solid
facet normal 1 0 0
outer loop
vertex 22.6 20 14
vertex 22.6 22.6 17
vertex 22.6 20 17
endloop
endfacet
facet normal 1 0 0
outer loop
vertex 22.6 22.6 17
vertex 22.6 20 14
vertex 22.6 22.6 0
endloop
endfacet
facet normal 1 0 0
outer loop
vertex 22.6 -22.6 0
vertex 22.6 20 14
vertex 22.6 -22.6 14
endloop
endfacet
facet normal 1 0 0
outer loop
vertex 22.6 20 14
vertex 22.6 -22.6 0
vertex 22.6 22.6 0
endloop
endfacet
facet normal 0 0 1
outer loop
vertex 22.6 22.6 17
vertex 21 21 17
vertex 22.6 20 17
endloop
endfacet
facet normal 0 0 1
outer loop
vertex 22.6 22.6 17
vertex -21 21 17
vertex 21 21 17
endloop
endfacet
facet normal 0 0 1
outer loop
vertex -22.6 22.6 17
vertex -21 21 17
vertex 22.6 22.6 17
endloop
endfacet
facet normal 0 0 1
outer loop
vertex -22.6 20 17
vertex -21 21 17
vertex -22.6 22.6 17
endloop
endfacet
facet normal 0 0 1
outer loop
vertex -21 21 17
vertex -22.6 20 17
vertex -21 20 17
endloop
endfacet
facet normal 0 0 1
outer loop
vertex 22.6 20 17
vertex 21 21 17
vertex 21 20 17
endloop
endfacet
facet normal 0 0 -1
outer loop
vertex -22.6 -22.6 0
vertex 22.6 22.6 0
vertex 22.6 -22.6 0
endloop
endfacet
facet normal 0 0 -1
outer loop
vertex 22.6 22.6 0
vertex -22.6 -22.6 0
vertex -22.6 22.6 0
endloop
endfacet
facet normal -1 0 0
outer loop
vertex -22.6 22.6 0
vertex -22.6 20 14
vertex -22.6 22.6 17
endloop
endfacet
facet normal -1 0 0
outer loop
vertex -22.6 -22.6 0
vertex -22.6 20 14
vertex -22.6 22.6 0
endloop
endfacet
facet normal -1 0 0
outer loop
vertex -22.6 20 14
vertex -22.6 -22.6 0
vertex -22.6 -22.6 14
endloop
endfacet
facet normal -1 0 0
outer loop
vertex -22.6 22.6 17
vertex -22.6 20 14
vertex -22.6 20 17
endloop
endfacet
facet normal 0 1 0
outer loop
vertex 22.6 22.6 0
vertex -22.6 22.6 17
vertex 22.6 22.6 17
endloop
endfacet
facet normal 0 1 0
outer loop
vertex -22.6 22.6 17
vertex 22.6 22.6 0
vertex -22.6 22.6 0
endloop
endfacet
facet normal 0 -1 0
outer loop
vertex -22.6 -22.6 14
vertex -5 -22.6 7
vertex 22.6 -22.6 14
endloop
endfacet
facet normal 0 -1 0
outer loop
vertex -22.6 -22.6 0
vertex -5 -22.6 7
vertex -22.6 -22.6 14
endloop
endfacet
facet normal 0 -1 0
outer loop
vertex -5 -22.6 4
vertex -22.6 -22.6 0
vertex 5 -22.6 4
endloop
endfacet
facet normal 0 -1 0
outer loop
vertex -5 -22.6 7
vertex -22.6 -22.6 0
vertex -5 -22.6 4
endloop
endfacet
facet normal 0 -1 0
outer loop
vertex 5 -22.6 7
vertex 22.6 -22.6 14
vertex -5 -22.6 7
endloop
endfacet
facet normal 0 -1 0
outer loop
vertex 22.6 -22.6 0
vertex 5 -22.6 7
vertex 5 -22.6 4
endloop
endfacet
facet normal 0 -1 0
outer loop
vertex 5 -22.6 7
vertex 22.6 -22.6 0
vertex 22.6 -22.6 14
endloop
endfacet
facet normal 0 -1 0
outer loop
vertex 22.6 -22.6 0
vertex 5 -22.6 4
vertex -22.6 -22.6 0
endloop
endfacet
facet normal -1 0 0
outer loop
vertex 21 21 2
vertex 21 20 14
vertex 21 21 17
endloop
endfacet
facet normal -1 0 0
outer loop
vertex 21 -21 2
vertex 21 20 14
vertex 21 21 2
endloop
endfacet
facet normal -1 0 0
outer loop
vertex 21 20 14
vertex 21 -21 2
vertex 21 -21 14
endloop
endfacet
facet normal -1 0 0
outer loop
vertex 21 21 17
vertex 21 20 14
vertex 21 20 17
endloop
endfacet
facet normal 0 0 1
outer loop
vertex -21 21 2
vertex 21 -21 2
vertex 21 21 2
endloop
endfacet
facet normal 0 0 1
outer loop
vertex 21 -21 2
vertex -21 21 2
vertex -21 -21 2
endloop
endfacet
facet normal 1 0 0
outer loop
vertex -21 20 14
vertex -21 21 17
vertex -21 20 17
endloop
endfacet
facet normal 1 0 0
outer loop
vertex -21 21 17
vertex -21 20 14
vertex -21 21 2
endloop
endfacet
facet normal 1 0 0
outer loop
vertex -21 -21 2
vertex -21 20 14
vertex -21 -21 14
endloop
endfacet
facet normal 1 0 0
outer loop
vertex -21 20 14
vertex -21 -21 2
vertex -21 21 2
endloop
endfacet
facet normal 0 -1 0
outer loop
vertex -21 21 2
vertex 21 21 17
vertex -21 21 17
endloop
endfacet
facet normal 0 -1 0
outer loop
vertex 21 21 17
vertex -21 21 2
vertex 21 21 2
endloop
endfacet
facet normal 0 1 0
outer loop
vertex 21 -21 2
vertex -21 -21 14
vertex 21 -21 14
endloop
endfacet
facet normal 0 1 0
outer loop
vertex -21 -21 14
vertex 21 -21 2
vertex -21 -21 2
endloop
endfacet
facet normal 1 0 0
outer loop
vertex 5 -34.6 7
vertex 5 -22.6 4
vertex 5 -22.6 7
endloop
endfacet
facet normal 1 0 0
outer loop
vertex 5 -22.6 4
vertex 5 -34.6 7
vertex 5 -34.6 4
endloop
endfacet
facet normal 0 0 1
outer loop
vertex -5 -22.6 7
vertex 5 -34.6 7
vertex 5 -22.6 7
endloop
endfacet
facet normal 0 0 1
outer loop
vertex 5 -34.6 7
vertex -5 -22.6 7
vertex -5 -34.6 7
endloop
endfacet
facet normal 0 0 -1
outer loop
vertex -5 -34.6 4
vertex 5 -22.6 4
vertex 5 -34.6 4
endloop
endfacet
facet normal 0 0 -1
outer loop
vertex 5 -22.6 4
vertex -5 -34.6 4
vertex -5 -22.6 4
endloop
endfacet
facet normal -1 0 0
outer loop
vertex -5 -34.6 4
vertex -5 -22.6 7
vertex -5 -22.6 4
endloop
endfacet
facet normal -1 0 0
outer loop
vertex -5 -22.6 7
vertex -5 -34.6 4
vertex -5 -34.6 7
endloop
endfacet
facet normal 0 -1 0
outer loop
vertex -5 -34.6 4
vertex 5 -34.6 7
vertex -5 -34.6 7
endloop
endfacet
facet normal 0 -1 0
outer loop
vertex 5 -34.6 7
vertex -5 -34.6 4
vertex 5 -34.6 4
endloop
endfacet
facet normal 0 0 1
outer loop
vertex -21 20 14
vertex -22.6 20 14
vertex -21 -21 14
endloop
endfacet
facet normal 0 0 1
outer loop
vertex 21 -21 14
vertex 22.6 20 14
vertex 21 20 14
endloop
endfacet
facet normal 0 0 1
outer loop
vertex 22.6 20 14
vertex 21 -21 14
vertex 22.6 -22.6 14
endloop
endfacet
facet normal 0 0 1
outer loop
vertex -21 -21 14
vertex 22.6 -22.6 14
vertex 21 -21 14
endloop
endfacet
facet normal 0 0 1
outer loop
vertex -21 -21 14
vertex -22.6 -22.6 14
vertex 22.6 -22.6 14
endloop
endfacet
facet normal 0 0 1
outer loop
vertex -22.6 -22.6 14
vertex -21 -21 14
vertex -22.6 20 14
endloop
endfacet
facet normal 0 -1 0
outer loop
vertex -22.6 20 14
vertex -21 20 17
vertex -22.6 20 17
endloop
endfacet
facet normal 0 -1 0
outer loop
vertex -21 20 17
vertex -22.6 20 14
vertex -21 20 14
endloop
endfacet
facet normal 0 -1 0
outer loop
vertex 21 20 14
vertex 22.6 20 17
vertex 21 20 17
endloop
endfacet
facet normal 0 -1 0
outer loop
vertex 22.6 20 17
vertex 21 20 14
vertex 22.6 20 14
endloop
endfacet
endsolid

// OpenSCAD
// file: ../lib/dovetail.scad
// lib/dovetail.scad
// Shared joinery modules: dovetail tenon/mortise, M3 insert boss, rounded box.
// Depends on values in params.scad (include it in the calling file).

// A dovetail tenon: a flared prism that grows wider toward its tip so it locks
// against a matching mortise when slid in along +y.
//   len   : protrusion length (along +y)
//   base_w: width at the root (x, near the part)
//   tip_w : width at the tip (x, wider -> self locking)
//   h     : height (z)
// Literal defaults keep this library self-contained under `use <>` (which does
// not import the caller's params). Callers pass explicit sizes where needed.
module dovetail_tenon(len = 8, base_w = 8, tip_w = 12, h = 10) {
    linear_extrude(height = h)
        polygon(points = [
            [-base_w/2, 0],
            [ base_w/2, 0],
            [ tip_w/2,  len],
            [-tip_w/2,  len],
        ]);
}

// Matching mortise volume (subtract this). Enlarged by tol_dovetail per side.
module dovetail_mortise(len = 8, base_w = 8, tip_w = 12, h = 10, clr = 0.15) {
    // extend slightly beyond both faces so the cut is clean
    translate([0, -0.01, -0.01])
        linear_extrude(height = h + 0.02)
            polygon(points = [
                [-(base_w/2 + clr), 0],
                [ (base_w/2 + clr), 0],
                [ (tip_w/2 + clr),  len + 0.02],
                [-(tip_w/2 + clr),  len + 0.02],
            ]);
}

// Cylindrical boss with a blind hole for a heat-set insert.
//   boss_d : outer diameter of the boss
//   boss_h : height
//   hole_d : insert press-hole diameter (params: m3_insert)
//   hole_depth : blind hole depth (0 = through)
module insert_boss(boss_d = 8, boss_h = 8, hole_d = 4.0, hole_depth = 0) {
    difference() {
        cylinder(d = boss_d, h = boss_h);
        translate([0, 0, hole_depth == 0 ? -0.01 : boss_h - hole_depth])
            cylinder(d = hole_d, h = hole_depth == 0 ? boss_h + 0.02 : hole_depth + 0.01);
    }
}

// Rounded rectangular box shell (open top) used by gondola / recesses.
module rounded_box(x, y, z, r = 2) {
    hull() {
        for (sx = [-1, 1], sy = [-1, 1])
            translate([sx * (x/2 - r), sy * (y/2 - r), 0])
                cylinder(r = r, h = z);
    }
}

// A simple rectangular slot cutter (for tabs), centered on x, open along z.
module slot(w, t, d) {
    translate([-w/2, -t/2, -0.01])
        cube([w, t, d + 0.02]);
}
// main file
// mini/adapter_gondola.scad  (#19: Artec wooden ferris kit 055521)
// Drop-in bucket that replaces one wooden gondola. A back peg (tab) mimics the
// wooden seat's protrusion that plugs into the arm-ring's outer hole, so the
// kit is not modified (reversible). Two variants for the ride-along figures.
//   variant = "atomcat"  : inner floor 42x42
//   variant = "minimal"  : inner floor 46x46
// Select at CLI: openscad -D 'variant="minimal"' -o mini-adapter-minimal.stl ...
//
// NOTE: tab/pitch/wheel/seat dimensions are PLACEHOLDERS pending caliper
// measurement (see params.scad mini_* and issue #19). Parametric: change the
// numbers in params.scad and regenerate.
//
// Prints back-face-down (the tab then points up) or floor-down with a tiny
// support under the peg. Modelled floor-down so the STL sits on z=0.

include <../params.scad>;
use <../lib/dovetail.scad>;

variant = "atomcat";     // overridden from the Makefile

inner  = (variant == "minimal") ? mini_minimal_in : mini_atomcat_in;
outer  = inner + 2 * mini_wall;

module adapter_gondola() {
    difference() {
        union() {
            // bucket: floor + back/side walls (mini_depth) + taller front guard
            difference() {
                translate([-outer/2, -outer/2, 0])
                    cube([outer, outer, mini_floor_t + max(mini_depth, mini_guard_h)]);
                // hollow the cavity (open top)
                translate([-inner/2, -inner/2, mini_floor_t])
                    cube([inner, inner, mini_depth + mini_guard_h + 1]);
            }
            // back peg that plugs into the arm-ring outer hole
            translate([-mini_tab_w/2, -outer/2 - mini_tab_l, mini_floor_t + 2])
                cube([mini_tab_w, mini_tab_l + 1, mini_tab_t]);
        }
        // lower the side + back walls to mini_depth (front stays as guard)
        translate([-inner/2 - mini_wall - 1, -outer/2 - 1, mini_floor_t + mini_depth])
            cube([outer + 2, outer - mini_wall, mini_guard_h + 2]);   // back+sides cut
    }
}

adapter_gondola();
